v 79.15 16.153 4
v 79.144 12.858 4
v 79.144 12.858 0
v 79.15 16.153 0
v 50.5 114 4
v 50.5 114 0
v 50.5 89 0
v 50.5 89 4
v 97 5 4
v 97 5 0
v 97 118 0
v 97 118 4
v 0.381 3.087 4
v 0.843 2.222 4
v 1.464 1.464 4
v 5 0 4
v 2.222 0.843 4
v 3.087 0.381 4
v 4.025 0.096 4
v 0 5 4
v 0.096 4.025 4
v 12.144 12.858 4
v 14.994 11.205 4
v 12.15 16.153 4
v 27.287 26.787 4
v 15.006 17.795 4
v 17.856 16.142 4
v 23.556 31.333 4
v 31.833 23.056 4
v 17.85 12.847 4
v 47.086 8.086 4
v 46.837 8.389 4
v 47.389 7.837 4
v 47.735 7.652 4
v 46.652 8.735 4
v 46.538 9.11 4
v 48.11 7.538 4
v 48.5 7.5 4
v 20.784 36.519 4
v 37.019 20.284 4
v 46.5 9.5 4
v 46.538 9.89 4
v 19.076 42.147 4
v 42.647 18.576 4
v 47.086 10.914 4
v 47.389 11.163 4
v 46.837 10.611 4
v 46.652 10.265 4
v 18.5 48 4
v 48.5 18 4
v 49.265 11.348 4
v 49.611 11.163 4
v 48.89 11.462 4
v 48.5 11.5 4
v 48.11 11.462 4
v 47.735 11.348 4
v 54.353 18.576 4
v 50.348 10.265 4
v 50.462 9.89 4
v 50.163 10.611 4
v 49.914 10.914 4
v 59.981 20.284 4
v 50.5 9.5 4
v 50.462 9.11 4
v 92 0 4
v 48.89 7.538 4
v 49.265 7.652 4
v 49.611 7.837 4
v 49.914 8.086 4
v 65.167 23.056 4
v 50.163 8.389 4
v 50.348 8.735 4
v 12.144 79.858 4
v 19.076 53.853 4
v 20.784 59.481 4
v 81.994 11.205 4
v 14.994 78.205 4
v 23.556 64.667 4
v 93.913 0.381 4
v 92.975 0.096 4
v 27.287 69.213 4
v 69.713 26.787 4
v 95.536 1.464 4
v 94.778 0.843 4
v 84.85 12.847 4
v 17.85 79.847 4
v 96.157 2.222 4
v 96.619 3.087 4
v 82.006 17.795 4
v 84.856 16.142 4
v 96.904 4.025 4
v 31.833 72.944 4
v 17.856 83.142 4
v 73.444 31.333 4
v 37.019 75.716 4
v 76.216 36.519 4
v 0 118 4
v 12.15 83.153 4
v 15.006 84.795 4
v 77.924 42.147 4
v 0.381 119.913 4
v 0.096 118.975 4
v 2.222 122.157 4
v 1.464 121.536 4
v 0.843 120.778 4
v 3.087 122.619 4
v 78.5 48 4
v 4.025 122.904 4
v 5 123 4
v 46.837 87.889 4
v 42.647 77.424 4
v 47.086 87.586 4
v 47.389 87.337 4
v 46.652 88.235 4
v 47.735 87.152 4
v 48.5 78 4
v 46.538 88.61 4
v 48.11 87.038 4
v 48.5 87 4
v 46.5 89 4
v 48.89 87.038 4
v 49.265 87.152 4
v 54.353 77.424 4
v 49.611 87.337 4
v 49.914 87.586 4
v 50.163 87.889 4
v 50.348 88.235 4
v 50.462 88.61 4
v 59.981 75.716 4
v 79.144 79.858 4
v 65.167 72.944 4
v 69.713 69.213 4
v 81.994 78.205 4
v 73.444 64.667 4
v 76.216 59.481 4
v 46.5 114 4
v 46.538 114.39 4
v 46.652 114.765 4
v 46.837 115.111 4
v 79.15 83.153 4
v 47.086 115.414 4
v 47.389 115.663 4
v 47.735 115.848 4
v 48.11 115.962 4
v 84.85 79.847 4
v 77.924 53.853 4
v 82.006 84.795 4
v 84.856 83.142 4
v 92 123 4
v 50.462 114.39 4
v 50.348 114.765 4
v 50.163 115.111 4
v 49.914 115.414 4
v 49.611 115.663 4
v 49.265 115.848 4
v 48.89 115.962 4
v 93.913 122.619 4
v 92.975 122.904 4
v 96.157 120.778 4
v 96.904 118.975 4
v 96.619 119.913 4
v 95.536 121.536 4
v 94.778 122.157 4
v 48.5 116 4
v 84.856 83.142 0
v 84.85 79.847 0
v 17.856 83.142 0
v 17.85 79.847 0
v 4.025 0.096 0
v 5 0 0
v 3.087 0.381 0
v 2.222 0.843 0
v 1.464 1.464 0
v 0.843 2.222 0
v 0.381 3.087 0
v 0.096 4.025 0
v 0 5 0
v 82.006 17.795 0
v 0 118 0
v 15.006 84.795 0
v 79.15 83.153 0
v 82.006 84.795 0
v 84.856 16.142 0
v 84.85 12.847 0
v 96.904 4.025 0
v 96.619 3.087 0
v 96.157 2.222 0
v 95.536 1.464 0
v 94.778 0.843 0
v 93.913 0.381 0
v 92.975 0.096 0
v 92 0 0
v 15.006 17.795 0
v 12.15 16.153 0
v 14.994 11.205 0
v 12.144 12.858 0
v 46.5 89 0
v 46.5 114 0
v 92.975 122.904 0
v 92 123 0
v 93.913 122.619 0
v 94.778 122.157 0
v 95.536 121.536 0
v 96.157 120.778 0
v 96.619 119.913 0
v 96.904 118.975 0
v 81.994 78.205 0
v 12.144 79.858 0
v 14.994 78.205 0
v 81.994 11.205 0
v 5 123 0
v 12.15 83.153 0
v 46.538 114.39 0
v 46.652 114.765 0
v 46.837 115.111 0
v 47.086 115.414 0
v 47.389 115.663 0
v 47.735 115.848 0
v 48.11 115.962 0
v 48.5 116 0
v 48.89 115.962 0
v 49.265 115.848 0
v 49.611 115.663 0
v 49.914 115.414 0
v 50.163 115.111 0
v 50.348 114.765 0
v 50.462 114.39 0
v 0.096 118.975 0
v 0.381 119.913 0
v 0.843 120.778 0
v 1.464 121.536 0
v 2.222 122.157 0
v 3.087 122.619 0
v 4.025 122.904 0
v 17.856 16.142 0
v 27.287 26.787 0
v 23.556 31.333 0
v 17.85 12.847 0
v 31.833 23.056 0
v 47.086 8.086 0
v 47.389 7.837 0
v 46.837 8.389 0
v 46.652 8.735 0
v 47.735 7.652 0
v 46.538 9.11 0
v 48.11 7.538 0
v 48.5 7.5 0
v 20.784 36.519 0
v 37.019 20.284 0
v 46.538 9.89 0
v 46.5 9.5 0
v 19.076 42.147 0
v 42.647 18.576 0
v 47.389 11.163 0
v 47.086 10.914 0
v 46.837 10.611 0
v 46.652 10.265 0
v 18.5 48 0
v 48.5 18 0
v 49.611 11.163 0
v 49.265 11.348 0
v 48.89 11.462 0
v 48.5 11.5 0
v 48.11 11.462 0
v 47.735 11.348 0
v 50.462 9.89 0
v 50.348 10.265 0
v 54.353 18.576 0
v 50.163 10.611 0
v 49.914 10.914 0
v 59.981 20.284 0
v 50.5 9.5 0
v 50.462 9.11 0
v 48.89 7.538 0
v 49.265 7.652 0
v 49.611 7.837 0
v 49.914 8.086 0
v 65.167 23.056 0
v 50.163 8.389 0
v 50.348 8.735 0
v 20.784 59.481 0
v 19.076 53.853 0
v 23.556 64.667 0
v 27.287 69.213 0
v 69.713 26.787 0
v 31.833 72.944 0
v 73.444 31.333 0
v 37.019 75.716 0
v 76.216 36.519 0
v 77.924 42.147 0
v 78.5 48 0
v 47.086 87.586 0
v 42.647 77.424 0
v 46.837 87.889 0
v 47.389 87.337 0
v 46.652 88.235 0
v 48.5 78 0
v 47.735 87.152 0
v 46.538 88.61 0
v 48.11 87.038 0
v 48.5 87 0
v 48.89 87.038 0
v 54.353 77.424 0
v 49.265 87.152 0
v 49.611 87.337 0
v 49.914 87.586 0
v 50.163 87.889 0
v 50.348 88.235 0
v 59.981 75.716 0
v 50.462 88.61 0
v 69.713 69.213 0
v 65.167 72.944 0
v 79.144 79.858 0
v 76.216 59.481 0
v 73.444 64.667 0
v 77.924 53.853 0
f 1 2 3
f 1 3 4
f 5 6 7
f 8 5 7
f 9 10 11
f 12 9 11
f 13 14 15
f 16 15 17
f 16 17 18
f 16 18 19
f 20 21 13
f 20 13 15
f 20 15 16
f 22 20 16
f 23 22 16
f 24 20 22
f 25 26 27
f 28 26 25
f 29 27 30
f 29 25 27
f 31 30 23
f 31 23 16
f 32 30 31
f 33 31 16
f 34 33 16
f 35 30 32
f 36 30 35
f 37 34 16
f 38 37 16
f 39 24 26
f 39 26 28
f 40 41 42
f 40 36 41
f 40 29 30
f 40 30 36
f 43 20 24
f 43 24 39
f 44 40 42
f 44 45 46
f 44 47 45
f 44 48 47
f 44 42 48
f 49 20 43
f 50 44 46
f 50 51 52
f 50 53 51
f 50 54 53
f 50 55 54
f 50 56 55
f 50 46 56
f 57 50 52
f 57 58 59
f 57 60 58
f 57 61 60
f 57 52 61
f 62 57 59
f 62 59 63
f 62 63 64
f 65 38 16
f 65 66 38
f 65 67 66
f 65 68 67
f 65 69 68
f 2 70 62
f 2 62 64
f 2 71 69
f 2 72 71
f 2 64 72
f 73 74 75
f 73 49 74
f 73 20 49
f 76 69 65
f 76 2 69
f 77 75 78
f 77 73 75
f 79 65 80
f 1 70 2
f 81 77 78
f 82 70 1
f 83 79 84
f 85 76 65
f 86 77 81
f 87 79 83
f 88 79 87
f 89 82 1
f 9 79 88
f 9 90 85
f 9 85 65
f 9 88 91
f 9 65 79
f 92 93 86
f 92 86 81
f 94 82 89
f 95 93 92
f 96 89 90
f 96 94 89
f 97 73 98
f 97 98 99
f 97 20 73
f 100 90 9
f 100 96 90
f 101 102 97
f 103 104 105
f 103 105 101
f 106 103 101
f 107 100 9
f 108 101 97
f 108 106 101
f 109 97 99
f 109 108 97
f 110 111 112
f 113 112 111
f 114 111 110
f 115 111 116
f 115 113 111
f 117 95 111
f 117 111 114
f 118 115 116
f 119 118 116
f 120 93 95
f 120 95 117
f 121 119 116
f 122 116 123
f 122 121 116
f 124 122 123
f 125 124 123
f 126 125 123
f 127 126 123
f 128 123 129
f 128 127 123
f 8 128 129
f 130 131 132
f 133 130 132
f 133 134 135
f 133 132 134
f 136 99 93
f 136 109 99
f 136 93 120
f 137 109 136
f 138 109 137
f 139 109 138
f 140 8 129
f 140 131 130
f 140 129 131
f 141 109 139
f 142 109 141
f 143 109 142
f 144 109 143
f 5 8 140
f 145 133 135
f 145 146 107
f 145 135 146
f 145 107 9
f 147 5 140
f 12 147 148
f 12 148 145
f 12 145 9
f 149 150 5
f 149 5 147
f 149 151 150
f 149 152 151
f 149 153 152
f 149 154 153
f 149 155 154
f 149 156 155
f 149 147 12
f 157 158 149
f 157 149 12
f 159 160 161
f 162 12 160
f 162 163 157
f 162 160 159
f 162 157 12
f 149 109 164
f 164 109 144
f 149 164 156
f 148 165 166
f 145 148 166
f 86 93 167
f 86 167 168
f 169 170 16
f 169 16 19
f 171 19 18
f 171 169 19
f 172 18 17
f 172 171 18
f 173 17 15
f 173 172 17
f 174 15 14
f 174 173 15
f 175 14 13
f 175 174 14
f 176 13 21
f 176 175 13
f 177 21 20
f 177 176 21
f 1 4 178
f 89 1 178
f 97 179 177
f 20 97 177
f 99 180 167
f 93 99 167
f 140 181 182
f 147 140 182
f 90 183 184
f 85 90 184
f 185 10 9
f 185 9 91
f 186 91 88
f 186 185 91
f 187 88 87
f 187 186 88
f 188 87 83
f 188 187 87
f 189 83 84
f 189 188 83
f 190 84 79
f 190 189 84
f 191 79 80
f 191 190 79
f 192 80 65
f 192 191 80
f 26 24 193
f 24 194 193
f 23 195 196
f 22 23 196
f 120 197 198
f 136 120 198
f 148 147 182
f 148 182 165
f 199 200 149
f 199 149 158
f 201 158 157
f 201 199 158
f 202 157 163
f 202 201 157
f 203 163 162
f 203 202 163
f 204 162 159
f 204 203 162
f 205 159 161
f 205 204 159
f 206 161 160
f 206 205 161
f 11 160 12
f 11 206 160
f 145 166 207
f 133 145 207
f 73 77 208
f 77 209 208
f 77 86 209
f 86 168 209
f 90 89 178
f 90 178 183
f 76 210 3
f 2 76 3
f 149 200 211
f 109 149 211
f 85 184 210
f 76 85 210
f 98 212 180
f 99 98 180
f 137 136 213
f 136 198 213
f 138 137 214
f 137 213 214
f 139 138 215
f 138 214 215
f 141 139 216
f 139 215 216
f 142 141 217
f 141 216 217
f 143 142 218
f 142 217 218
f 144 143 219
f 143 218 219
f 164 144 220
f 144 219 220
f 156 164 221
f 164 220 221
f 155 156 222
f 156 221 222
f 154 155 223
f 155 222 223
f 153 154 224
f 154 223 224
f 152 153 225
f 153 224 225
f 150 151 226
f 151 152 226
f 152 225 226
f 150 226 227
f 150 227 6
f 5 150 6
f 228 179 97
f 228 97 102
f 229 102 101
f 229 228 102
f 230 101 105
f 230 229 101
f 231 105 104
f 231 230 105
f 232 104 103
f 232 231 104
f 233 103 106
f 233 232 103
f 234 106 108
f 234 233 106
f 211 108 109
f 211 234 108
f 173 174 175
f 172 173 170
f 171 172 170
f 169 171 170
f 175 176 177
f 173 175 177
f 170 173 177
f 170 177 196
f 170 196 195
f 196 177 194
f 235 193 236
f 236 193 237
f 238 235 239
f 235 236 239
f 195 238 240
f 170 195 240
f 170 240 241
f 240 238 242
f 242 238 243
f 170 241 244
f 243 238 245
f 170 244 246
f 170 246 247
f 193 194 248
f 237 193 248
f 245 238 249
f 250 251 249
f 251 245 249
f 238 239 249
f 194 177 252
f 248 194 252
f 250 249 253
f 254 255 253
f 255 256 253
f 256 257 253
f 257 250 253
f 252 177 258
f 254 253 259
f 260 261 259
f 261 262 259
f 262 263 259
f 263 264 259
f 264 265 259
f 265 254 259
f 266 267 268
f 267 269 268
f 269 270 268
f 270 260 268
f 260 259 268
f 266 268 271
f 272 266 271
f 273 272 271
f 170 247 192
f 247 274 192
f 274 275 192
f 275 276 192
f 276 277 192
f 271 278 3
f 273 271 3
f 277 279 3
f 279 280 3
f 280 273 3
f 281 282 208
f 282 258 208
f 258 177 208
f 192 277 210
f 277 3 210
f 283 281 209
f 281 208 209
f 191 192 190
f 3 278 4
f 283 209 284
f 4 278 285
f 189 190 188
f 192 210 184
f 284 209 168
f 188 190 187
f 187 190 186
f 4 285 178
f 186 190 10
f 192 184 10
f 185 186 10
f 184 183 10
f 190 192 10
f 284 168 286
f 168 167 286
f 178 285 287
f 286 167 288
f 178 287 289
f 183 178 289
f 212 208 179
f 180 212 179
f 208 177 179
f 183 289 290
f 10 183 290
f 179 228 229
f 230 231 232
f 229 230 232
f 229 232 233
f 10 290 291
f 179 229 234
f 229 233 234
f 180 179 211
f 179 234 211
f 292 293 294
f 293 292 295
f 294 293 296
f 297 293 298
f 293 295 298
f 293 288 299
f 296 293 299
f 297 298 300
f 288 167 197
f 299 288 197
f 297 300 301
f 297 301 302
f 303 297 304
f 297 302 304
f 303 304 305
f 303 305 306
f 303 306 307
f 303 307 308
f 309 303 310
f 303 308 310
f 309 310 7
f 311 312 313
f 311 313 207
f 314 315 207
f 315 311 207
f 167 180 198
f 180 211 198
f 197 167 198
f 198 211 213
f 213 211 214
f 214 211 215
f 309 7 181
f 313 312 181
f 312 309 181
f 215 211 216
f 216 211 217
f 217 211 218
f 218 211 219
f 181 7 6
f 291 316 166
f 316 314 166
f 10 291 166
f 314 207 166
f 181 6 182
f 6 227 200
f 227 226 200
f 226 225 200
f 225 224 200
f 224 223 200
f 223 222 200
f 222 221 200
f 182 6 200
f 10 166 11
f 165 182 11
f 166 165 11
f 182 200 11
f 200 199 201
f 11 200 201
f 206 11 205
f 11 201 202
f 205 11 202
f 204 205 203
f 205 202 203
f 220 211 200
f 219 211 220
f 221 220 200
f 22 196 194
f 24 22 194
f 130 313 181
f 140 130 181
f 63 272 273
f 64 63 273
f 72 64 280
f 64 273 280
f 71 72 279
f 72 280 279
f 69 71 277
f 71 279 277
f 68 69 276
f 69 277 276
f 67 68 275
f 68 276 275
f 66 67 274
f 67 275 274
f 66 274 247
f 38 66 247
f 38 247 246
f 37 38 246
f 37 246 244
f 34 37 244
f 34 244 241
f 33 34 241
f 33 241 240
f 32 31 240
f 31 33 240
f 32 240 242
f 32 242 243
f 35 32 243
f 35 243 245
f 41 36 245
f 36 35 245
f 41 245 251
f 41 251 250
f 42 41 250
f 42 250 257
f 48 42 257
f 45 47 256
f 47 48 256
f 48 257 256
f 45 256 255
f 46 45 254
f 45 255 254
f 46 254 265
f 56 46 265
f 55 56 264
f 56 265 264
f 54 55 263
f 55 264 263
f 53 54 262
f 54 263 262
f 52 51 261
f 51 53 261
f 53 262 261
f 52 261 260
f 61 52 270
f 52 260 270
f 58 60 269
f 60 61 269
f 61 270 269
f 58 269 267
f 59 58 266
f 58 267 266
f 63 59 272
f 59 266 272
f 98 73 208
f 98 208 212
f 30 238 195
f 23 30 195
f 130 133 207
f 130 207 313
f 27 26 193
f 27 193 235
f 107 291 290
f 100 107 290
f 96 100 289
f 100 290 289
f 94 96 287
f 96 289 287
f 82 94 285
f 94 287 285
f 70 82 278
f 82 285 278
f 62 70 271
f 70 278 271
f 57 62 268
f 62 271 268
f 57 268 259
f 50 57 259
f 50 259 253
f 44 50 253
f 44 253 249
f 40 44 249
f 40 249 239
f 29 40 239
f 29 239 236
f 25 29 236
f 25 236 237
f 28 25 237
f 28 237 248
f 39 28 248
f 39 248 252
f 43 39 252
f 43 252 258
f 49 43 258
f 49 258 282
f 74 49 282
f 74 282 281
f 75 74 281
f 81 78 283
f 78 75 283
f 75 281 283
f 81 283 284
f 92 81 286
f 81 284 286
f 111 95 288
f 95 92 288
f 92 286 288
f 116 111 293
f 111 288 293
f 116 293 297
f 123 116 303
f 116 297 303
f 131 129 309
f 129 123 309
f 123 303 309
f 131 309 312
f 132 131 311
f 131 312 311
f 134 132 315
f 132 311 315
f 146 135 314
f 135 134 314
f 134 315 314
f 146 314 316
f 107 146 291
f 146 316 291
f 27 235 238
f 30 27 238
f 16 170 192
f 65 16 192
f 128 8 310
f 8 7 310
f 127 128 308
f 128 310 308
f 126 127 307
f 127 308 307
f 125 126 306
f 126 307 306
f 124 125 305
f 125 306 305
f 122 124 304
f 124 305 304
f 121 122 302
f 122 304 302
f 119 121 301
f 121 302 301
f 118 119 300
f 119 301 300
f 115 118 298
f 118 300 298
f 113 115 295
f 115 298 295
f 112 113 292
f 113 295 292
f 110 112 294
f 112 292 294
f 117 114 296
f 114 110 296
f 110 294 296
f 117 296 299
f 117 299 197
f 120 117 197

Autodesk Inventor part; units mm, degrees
ref_plane "YZ Plane" through (0, 0, 0) normal (1, 0, 0) x (0, 1, 0)
ref_plane "XZ Plane" through (0, 0, 0) normal (0, 1, 0) x (-1, 0, 0)
ref_plane "XY Plane" through (0, 0, 0) normal (0, 0, 1) x (1, 0, 0)
sketch "Эскиз1" plane through (0, 0, 0) normal (0, 0, 1) x (1, 0, 0)
  line L0 (5, 0) -> (92, 0)
  line L1 (97, 5) -> (97, 118)
  line L2 (92, 123) -> (5, 123)
  line L3 (0, 118) -> (0, 5)
  circle A0 centre (48.5, 48) radius 30
  arc A1 (5, 123) -> (0, 118) centre (5, 118) ccw
  arc A2 (97, 118) -> (92, 123) centre (92, 118) ccw
  arc A3 (92, 0) -> (97, 5) centre (92, 5) ccw
  arc A4 (0, 5) -> (5, 0) centre (5, 5) ccw
  arc A5 (46.5, 89) -> (50.5, 89) centre (48.5, 89) ccw
  arc A6 (50.5, 114) -> (46.5, 114) centre (48.5, 114) ccw
  line L4 (46.5, 89) -> (46.5, 114)
  line L5 (50.5, 114) -> (50.5, 89)
  circle A7 centre (48.5, 9.5) radius 2
  line L6 (12.1435, 79.8578) -> (12.1496, 83.1527)
  line L7 (12.1496, 83.1527) -> (15.0061, 84.7949)
  line L8 (15.0061, 84.7949) -> (17.8565, 83.1422)
  line L9 (17.8565, 83.1422) -> (17.8504, 79.8473)
  line L10 (17.8504, 79.8473) -> (14.9939, 78.2051)
  line L11 (14.9939, 78.2051) -> (12.1435, 79.8578)
  line L12 (12.1435, 12.8578) -> (12.1496, 16.1527)
  line L13 (12.1496, 16.1527) -> (15.0061, 17.7949)
  line L14 (15.0061, 17.7949) -> (17.8565, 16.1422)
  line L15 (17.8565, 16.1422) -> (17.8504, 12.8473)
  line L16 (17.8504, 12.8473) -> (14.9939, 11.2051)
  line L17 (14.9939, 11.2051) -> (12.1435, 12.8578)
  line L18 (79.1435, 12.8578) -> (79.1496, 16.1527)
  line L19 (79.1496, 16.1527) -> (82.0061, 17.7949)
  line L20 (82.0061, 17.7949) -> (84.8565, 16.1422)
  line L21 (84.8565, 16.1422) -> (84.8504, 12.8473)
  line L22 (84.8504, 12.8473) -> (81.9939, 11.2051)
  line L23 (81.9939, 11.2051) -> (79.1435, 12.8578)
  line L24 (79.1435, 79.8578) -> (79.1496, 83.1527)
  line L25 (79.1496, 83.1527) -> (82.0061, 84.7949)
  line L26 (82.0061, 84.7949) -> (84.8565, 83.1422)
  line L27 (84.8565, 83.1422) -> (84.8504, 79.8473)
  line L28 (84.8504, 79.8473) -> (81.9939, 78.2051)
  line L29 (81.9939, 78.2051) -> (79.1435, 79.8578)
  point P0 (0, 0)
  point P1 (97, 123)
  point P2 (0, 123)
  point P3 (15, 81.5)
  point P4 (15, 14.5)
  point P5 (15, 14.5)
  point P6 (82, 14.5)
  point P7 (82, 14.5)
  point P8 (82, 81.5)
  point P9 (82, 81.5)
  dimension "d10" = 5
  dimension "d21" = 4
  dimension "d22" = 4
  dimension "d23" = 4
extrude "Выдавливание1" add sketch "Эскиз1" along normal blind 4
properties part number "Адаптер для считывателя Bolid Proxy-2MA часть 2"
